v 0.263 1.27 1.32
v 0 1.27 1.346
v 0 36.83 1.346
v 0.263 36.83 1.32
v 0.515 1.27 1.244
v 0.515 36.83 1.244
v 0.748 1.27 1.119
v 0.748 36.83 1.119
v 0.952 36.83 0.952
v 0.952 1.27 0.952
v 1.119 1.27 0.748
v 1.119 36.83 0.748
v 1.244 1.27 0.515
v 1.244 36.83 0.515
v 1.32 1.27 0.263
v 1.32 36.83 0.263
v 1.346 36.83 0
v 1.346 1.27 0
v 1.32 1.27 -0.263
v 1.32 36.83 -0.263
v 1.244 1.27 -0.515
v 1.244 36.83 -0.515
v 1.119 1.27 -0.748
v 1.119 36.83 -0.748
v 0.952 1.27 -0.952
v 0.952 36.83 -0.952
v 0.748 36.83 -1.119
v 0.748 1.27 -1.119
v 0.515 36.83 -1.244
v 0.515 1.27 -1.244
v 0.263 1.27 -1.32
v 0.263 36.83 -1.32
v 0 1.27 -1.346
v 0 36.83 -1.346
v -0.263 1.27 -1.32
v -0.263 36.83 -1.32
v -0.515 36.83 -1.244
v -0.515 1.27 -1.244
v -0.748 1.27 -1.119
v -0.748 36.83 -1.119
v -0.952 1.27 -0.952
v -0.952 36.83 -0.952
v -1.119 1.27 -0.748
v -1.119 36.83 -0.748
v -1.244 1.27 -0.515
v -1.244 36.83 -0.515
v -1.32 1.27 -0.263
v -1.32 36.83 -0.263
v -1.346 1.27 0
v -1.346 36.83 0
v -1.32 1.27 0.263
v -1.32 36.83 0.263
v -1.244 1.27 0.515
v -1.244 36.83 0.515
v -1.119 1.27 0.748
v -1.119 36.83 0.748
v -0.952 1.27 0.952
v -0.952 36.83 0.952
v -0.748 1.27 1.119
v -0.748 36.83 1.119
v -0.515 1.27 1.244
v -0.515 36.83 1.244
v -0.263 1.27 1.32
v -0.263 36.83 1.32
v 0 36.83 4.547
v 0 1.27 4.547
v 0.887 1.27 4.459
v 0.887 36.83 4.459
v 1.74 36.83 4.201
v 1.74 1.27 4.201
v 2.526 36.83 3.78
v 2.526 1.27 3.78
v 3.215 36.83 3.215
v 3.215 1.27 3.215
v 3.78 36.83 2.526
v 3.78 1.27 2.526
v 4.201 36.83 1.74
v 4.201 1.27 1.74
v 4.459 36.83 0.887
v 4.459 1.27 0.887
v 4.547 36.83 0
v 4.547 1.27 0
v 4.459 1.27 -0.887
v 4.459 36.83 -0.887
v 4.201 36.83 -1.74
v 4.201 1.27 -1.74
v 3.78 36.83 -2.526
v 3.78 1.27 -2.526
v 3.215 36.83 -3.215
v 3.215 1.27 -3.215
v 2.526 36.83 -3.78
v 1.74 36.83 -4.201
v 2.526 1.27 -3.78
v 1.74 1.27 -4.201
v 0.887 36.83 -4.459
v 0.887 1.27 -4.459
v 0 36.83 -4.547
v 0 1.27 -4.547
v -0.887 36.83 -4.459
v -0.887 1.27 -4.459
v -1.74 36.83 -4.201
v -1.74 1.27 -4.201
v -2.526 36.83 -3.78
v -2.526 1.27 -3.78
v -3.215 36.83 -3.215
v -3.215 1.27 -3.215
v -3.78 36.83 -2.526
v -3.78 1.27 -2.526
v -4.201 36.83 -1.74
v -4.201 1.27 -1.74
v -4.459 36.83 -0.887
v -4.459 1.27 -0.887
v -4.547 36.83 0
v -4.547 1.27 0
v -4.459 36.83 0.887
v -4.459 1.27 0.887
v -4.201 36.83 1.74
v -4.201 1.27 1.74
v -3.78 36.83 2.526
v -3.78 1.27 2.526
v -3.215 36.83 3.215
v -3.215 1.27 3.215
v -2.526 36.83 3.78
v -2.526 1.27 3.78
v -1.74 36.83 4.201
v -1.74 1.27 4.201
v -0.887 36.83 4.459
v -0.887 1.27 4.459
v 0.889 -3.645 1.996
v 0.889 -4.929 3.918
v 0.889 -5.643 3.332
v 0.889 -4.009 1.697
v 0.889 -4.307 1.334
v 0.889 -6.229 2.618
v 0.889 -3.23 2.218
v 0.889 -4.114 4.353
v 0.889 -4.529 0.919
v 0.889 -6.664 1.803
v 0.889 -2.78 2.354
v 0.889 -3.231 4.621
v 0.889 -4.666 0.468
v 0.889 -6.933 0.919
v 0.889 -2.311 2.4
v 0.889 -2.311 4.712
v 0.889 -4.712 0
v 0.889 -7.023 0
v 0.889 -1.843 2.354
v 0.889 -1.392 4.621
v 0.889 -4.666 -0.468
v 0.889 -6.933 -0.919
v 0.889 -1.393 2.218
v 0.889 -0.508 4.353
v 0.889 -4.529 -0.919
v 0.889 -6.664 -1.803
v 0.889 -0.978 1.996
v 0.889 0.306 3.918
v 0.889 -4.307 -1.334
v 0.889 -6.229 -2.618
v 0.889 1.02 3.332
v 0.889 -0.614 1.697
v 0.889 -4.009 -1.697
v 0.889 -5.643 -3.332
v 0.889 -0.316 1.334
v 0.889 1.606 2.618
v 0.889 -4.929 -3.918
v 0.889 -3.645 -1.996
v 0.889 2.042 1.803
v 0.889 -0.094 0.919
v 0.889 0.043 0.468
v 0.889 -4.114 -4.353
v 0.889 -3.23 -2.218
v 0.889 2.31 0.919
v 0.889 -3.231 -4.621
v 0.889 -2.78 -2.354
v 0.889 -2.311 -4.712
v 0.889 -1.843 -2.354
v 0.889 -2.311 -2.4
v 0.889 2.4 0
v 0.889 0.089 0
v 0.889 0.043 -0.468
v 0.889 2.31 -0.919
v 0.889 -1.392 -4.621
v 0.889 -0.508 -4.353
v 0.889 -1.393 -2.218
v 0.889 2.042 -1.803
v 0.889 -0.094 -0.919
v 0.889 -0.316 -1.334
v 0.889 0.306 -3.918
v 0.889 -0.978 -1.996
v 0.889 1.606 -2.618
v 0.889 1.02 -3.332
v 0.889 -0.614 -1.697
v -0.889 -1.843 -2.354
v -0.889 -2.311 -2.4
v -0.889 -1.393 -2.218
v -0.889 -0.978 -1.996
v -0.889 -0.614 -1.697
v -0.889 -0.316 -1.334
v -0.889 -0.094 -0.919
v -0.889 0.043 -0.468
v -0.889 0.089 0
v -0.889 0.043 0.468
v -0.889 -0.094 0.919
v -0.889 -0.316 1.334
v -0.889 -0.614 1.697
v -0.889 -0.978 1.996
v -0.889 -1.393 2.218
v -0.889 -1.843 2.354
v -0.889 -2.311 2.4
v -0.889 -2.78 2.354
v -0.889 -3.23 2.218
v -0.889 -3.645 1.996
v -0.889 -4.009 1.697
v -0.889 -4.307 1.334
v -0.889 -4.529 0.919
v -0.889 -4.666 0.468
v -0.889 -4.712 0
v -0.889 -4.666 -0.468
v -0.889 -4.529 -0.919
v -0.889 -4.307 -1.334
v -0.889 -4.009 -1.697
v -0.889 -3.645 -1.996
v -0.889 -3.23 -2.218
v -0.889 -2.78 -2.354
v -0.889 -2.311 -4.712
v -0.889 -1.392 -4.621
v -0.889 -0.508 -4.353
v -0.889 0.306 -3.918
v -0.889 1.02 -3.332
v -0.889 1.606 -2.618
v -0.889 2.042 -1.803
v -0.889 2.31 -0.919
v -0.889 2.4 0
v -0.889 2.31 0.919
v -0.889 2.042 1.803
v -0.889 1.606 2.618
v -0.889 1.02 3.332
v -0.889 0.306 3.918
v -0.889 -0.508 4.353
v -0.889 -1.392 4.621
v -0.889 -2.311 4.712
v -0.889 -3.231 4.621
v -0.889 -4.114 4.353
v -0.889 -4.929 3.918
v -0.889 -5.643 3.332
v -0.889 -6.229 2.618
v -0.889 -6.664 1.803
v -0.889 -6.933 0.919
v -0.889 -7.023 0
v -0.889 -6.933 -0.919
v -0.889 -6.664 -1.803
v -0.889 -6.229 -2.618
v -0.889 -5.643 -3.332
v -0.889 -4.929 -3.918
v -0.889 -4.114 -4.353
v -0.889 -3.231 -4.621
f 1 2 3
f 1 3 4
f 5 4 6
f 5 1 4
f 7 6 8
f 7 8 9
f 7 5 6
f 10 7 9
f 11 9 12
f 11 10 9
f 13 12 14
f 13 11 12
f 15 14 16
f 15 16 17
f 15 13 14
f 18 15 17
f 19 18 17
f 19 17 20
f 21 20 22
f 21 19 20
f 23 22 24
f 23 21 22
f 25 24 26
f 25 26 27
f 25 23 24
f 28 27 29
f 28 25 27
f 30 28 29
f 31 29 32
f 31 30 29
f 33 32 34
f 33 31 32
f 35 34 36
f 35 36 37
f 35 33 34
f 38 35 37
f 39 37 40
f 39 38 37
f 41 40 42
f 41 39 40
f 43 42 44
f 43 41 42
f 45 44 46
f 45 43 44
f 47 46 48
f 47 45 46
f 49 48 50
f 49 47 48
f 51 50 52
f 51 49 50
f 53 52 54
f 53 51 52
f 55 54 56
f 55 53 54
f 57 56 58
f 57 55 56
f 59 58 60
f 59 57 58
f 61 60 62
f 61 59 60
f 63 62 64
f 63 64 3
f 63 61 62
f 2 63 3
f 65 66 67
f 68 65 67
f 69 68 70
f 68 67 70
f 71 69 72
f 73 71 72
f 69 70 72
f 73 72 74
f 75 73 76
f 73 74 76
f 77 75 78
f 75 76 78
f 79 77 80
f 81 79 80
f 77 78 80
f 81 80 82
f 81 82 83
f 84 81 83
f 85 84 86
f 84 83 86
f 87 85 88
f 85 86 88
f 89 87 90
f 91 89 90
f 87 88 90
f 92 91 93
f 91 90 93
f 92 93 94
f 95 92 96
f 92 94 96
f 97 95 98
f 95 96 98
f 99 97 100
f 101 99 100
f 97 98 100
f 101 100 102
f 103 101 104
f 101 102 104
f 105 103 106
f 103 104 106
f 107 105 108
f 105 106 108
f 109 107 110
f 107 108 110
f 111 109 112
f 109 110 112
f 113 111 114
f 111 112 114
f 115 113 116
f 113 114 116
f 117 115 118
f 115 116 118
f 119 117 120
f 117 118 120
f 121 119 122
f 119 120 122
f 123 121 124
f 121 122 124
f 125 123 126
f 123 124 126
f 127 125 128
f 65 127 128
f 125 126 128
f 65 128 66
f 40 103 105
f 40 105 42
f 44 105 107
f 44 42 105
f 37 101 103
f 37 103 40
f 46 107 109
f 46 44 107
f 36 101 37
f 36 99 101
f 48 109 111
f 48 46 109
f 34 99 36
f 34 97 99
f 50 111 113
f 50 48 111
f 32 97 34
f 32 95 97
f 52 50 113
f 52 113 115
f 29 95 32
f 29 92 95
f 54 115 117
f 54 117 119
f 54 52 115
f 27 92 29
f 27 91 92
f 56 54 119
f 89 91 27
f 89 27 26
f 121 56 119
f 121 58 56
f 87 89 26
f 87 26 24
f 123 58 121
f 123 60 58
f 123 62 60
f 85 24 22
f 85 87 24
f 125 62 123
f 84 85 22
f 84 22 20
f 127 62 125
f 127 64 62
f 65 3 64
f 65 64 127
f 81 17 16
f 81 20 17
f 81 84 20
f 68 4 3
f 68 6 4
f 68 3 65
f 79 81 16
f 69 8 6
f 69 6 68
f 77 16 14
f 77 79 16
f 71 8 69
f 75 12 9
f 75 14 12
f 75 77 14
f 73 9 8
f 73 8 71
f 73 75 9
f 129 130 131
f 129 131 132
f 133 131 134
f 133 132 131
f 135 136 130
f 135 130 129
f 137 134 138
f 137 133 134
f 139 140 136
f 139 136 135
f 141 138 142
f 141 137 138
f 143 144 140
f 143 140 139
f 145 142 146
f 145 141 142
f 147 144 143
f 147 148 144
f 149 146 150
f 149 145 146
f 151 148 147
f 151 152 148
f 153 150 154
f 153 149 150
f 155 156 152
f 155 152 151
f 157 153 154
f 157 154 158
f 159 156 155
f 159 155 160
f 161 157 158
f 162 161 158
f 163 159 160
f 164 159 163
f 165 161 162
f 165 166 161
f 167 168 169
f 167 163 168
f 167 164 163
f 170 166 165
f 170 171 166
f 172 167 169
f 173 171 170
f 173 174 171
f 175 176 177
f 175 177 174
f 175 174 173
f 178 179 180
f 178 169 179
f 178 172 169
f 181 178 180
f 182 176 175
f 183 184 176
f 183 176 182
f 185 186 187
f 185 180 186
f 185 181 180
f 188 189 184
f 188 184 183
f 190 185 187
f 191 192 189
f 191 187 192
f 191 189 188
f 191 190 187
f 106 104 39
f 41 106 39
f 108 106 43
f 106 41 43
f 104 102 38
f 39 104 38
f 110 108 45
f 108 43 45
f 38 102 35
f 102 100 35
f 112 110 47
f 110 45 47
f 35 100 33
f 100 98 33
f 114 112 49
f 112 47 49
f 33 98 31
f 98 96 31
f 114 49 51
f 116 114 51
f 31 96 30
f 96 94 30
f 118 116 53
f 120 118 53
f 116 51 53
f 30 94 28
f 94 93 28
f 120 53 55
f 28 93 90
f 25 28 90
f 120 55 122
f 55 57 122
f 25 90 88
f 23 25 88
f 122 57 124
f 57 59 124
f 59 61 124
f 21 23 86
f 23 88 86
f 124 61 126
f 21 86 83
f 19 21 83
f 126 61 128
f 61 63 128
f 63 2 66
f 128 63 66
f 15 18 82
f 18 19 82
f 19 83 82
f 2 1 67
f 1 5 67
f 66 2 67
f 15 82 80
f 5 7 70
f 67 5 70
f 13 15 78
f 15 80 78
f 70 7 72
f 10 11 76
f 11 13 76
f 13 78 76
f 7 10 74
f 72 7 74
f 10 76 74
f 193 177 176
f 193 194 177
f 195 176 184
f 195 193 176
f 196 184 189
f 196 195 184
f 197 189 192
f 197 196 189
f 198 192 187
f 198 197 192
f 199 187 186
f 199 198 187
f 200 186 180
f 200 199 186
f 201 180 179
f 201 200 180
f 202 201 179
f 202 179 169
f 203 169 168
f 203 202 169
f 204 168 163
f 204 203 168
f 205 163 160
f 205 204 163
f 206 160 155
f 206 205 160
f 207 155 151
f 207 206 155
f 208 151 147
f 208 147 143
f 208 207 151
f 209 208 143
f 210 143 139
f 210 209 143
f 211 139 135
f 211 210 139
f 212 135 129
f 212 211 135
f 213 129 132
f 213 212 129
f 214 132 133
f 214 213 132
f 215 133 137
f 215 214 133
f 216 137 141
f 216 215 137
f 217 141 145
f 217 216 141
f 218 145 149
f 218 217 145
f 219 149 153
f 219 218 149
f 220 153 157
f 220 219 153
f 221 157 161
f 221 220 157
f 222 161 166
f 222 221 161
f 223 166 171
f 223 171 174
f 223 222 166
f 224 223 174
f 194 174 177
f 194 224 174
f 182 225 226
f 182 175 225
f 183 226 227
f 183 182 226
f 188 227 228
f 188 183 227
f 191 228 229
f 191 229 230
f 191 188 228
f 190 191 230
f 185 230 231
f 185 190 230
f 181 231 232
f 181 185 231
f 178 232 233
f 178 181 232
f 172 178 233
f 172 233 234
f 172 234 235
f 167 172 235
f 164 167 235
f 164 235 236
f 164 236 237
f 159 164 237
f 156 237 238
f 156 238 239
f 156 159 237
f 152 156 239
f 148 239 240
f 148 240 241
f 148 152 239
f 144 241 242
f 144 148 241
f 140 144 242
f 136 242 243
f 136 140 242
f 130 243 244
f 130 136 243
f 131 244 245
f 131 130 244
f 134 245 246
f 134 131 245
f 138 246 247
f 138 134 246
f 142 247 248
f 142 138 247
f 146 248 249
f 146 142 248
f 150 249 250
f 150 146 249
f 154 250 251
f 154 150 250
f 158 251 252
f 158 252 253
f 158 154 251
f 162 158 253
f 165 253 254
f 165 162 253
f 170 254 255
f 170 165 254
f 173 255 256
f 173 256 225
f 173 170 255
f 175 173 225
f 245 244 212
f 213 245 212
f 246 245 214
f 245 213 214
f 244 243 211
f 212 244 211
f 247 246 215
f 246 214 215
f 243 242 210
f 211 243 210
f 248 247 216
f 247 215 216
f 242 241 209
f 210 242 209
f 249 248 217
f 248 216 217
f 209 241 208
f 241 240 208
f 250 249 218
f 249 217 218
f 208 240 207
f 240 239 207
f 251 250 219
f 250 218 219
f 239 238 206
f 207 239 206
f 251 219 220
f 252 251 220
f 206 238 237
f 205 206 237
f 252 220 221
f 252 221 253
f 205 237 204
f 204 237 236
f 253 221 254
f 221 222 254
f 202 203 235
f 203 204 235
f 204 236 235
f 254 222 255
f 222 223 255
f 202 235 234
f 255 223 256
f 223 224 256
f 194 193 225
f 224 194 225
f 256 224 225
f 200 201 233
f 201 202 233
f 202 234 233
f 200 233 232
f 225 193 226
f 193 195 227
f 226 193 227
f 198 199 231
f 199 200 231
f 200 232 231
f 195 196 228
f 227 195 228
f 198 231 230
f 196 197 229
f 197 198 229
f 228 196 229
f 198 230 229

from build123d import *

# Parameters (mm, degrees)
EXTRUDE1_START = 1.27
SKETCH1_R      = 4.5466
SKETCH1_R_2    = 1.3462
EXTRUDE1_DEPTH = 35.56
SKETCH4_R      = 4.7117
SKETCH4_R_2    = 2.4003
EXTRUDE2_DEPTH = 0.889


with BuildPart() as part:
    # Sketch1 → Extrude1 (new body)
    with BuildSketch(Plane(origin=(0, 0, 0), x_dir=(1, 0, 0), z_dir=(0, 1, 0)).offset(EXTRUDE1_START)):
        with Locations(Location((0, 0, 0), (0, 0, 270))):
            Circle(SKETCH1_R)
        with Locations(Location((0, 0, 0), (0, 0, 270))):
            Circle(SKETCH1_R_2, mode=Mode.SUBTRACT)
    extrude(amount=EXTRUDE1_DEPTH)


with BuildPart() as body_2:
    # Sketch4 → Extrude2 (new, symmetric)
    with BuildSketch(Plane(origin=(0, 0, 0), x_dir=(0, 0, -1), z_dir=(1, 0, 0))):
        with Locations((0, -2.3114)):
            Circle(SKETCH4_R)
        with Locations((0, -2.3114)):
            Circle(SKETCH4_R_2, mode=Mode.SUBTRACT)
    extrude(amount=EXTRUDE2_DEPTH, both=True)


solid = Compound([part.part, body_2.part])
